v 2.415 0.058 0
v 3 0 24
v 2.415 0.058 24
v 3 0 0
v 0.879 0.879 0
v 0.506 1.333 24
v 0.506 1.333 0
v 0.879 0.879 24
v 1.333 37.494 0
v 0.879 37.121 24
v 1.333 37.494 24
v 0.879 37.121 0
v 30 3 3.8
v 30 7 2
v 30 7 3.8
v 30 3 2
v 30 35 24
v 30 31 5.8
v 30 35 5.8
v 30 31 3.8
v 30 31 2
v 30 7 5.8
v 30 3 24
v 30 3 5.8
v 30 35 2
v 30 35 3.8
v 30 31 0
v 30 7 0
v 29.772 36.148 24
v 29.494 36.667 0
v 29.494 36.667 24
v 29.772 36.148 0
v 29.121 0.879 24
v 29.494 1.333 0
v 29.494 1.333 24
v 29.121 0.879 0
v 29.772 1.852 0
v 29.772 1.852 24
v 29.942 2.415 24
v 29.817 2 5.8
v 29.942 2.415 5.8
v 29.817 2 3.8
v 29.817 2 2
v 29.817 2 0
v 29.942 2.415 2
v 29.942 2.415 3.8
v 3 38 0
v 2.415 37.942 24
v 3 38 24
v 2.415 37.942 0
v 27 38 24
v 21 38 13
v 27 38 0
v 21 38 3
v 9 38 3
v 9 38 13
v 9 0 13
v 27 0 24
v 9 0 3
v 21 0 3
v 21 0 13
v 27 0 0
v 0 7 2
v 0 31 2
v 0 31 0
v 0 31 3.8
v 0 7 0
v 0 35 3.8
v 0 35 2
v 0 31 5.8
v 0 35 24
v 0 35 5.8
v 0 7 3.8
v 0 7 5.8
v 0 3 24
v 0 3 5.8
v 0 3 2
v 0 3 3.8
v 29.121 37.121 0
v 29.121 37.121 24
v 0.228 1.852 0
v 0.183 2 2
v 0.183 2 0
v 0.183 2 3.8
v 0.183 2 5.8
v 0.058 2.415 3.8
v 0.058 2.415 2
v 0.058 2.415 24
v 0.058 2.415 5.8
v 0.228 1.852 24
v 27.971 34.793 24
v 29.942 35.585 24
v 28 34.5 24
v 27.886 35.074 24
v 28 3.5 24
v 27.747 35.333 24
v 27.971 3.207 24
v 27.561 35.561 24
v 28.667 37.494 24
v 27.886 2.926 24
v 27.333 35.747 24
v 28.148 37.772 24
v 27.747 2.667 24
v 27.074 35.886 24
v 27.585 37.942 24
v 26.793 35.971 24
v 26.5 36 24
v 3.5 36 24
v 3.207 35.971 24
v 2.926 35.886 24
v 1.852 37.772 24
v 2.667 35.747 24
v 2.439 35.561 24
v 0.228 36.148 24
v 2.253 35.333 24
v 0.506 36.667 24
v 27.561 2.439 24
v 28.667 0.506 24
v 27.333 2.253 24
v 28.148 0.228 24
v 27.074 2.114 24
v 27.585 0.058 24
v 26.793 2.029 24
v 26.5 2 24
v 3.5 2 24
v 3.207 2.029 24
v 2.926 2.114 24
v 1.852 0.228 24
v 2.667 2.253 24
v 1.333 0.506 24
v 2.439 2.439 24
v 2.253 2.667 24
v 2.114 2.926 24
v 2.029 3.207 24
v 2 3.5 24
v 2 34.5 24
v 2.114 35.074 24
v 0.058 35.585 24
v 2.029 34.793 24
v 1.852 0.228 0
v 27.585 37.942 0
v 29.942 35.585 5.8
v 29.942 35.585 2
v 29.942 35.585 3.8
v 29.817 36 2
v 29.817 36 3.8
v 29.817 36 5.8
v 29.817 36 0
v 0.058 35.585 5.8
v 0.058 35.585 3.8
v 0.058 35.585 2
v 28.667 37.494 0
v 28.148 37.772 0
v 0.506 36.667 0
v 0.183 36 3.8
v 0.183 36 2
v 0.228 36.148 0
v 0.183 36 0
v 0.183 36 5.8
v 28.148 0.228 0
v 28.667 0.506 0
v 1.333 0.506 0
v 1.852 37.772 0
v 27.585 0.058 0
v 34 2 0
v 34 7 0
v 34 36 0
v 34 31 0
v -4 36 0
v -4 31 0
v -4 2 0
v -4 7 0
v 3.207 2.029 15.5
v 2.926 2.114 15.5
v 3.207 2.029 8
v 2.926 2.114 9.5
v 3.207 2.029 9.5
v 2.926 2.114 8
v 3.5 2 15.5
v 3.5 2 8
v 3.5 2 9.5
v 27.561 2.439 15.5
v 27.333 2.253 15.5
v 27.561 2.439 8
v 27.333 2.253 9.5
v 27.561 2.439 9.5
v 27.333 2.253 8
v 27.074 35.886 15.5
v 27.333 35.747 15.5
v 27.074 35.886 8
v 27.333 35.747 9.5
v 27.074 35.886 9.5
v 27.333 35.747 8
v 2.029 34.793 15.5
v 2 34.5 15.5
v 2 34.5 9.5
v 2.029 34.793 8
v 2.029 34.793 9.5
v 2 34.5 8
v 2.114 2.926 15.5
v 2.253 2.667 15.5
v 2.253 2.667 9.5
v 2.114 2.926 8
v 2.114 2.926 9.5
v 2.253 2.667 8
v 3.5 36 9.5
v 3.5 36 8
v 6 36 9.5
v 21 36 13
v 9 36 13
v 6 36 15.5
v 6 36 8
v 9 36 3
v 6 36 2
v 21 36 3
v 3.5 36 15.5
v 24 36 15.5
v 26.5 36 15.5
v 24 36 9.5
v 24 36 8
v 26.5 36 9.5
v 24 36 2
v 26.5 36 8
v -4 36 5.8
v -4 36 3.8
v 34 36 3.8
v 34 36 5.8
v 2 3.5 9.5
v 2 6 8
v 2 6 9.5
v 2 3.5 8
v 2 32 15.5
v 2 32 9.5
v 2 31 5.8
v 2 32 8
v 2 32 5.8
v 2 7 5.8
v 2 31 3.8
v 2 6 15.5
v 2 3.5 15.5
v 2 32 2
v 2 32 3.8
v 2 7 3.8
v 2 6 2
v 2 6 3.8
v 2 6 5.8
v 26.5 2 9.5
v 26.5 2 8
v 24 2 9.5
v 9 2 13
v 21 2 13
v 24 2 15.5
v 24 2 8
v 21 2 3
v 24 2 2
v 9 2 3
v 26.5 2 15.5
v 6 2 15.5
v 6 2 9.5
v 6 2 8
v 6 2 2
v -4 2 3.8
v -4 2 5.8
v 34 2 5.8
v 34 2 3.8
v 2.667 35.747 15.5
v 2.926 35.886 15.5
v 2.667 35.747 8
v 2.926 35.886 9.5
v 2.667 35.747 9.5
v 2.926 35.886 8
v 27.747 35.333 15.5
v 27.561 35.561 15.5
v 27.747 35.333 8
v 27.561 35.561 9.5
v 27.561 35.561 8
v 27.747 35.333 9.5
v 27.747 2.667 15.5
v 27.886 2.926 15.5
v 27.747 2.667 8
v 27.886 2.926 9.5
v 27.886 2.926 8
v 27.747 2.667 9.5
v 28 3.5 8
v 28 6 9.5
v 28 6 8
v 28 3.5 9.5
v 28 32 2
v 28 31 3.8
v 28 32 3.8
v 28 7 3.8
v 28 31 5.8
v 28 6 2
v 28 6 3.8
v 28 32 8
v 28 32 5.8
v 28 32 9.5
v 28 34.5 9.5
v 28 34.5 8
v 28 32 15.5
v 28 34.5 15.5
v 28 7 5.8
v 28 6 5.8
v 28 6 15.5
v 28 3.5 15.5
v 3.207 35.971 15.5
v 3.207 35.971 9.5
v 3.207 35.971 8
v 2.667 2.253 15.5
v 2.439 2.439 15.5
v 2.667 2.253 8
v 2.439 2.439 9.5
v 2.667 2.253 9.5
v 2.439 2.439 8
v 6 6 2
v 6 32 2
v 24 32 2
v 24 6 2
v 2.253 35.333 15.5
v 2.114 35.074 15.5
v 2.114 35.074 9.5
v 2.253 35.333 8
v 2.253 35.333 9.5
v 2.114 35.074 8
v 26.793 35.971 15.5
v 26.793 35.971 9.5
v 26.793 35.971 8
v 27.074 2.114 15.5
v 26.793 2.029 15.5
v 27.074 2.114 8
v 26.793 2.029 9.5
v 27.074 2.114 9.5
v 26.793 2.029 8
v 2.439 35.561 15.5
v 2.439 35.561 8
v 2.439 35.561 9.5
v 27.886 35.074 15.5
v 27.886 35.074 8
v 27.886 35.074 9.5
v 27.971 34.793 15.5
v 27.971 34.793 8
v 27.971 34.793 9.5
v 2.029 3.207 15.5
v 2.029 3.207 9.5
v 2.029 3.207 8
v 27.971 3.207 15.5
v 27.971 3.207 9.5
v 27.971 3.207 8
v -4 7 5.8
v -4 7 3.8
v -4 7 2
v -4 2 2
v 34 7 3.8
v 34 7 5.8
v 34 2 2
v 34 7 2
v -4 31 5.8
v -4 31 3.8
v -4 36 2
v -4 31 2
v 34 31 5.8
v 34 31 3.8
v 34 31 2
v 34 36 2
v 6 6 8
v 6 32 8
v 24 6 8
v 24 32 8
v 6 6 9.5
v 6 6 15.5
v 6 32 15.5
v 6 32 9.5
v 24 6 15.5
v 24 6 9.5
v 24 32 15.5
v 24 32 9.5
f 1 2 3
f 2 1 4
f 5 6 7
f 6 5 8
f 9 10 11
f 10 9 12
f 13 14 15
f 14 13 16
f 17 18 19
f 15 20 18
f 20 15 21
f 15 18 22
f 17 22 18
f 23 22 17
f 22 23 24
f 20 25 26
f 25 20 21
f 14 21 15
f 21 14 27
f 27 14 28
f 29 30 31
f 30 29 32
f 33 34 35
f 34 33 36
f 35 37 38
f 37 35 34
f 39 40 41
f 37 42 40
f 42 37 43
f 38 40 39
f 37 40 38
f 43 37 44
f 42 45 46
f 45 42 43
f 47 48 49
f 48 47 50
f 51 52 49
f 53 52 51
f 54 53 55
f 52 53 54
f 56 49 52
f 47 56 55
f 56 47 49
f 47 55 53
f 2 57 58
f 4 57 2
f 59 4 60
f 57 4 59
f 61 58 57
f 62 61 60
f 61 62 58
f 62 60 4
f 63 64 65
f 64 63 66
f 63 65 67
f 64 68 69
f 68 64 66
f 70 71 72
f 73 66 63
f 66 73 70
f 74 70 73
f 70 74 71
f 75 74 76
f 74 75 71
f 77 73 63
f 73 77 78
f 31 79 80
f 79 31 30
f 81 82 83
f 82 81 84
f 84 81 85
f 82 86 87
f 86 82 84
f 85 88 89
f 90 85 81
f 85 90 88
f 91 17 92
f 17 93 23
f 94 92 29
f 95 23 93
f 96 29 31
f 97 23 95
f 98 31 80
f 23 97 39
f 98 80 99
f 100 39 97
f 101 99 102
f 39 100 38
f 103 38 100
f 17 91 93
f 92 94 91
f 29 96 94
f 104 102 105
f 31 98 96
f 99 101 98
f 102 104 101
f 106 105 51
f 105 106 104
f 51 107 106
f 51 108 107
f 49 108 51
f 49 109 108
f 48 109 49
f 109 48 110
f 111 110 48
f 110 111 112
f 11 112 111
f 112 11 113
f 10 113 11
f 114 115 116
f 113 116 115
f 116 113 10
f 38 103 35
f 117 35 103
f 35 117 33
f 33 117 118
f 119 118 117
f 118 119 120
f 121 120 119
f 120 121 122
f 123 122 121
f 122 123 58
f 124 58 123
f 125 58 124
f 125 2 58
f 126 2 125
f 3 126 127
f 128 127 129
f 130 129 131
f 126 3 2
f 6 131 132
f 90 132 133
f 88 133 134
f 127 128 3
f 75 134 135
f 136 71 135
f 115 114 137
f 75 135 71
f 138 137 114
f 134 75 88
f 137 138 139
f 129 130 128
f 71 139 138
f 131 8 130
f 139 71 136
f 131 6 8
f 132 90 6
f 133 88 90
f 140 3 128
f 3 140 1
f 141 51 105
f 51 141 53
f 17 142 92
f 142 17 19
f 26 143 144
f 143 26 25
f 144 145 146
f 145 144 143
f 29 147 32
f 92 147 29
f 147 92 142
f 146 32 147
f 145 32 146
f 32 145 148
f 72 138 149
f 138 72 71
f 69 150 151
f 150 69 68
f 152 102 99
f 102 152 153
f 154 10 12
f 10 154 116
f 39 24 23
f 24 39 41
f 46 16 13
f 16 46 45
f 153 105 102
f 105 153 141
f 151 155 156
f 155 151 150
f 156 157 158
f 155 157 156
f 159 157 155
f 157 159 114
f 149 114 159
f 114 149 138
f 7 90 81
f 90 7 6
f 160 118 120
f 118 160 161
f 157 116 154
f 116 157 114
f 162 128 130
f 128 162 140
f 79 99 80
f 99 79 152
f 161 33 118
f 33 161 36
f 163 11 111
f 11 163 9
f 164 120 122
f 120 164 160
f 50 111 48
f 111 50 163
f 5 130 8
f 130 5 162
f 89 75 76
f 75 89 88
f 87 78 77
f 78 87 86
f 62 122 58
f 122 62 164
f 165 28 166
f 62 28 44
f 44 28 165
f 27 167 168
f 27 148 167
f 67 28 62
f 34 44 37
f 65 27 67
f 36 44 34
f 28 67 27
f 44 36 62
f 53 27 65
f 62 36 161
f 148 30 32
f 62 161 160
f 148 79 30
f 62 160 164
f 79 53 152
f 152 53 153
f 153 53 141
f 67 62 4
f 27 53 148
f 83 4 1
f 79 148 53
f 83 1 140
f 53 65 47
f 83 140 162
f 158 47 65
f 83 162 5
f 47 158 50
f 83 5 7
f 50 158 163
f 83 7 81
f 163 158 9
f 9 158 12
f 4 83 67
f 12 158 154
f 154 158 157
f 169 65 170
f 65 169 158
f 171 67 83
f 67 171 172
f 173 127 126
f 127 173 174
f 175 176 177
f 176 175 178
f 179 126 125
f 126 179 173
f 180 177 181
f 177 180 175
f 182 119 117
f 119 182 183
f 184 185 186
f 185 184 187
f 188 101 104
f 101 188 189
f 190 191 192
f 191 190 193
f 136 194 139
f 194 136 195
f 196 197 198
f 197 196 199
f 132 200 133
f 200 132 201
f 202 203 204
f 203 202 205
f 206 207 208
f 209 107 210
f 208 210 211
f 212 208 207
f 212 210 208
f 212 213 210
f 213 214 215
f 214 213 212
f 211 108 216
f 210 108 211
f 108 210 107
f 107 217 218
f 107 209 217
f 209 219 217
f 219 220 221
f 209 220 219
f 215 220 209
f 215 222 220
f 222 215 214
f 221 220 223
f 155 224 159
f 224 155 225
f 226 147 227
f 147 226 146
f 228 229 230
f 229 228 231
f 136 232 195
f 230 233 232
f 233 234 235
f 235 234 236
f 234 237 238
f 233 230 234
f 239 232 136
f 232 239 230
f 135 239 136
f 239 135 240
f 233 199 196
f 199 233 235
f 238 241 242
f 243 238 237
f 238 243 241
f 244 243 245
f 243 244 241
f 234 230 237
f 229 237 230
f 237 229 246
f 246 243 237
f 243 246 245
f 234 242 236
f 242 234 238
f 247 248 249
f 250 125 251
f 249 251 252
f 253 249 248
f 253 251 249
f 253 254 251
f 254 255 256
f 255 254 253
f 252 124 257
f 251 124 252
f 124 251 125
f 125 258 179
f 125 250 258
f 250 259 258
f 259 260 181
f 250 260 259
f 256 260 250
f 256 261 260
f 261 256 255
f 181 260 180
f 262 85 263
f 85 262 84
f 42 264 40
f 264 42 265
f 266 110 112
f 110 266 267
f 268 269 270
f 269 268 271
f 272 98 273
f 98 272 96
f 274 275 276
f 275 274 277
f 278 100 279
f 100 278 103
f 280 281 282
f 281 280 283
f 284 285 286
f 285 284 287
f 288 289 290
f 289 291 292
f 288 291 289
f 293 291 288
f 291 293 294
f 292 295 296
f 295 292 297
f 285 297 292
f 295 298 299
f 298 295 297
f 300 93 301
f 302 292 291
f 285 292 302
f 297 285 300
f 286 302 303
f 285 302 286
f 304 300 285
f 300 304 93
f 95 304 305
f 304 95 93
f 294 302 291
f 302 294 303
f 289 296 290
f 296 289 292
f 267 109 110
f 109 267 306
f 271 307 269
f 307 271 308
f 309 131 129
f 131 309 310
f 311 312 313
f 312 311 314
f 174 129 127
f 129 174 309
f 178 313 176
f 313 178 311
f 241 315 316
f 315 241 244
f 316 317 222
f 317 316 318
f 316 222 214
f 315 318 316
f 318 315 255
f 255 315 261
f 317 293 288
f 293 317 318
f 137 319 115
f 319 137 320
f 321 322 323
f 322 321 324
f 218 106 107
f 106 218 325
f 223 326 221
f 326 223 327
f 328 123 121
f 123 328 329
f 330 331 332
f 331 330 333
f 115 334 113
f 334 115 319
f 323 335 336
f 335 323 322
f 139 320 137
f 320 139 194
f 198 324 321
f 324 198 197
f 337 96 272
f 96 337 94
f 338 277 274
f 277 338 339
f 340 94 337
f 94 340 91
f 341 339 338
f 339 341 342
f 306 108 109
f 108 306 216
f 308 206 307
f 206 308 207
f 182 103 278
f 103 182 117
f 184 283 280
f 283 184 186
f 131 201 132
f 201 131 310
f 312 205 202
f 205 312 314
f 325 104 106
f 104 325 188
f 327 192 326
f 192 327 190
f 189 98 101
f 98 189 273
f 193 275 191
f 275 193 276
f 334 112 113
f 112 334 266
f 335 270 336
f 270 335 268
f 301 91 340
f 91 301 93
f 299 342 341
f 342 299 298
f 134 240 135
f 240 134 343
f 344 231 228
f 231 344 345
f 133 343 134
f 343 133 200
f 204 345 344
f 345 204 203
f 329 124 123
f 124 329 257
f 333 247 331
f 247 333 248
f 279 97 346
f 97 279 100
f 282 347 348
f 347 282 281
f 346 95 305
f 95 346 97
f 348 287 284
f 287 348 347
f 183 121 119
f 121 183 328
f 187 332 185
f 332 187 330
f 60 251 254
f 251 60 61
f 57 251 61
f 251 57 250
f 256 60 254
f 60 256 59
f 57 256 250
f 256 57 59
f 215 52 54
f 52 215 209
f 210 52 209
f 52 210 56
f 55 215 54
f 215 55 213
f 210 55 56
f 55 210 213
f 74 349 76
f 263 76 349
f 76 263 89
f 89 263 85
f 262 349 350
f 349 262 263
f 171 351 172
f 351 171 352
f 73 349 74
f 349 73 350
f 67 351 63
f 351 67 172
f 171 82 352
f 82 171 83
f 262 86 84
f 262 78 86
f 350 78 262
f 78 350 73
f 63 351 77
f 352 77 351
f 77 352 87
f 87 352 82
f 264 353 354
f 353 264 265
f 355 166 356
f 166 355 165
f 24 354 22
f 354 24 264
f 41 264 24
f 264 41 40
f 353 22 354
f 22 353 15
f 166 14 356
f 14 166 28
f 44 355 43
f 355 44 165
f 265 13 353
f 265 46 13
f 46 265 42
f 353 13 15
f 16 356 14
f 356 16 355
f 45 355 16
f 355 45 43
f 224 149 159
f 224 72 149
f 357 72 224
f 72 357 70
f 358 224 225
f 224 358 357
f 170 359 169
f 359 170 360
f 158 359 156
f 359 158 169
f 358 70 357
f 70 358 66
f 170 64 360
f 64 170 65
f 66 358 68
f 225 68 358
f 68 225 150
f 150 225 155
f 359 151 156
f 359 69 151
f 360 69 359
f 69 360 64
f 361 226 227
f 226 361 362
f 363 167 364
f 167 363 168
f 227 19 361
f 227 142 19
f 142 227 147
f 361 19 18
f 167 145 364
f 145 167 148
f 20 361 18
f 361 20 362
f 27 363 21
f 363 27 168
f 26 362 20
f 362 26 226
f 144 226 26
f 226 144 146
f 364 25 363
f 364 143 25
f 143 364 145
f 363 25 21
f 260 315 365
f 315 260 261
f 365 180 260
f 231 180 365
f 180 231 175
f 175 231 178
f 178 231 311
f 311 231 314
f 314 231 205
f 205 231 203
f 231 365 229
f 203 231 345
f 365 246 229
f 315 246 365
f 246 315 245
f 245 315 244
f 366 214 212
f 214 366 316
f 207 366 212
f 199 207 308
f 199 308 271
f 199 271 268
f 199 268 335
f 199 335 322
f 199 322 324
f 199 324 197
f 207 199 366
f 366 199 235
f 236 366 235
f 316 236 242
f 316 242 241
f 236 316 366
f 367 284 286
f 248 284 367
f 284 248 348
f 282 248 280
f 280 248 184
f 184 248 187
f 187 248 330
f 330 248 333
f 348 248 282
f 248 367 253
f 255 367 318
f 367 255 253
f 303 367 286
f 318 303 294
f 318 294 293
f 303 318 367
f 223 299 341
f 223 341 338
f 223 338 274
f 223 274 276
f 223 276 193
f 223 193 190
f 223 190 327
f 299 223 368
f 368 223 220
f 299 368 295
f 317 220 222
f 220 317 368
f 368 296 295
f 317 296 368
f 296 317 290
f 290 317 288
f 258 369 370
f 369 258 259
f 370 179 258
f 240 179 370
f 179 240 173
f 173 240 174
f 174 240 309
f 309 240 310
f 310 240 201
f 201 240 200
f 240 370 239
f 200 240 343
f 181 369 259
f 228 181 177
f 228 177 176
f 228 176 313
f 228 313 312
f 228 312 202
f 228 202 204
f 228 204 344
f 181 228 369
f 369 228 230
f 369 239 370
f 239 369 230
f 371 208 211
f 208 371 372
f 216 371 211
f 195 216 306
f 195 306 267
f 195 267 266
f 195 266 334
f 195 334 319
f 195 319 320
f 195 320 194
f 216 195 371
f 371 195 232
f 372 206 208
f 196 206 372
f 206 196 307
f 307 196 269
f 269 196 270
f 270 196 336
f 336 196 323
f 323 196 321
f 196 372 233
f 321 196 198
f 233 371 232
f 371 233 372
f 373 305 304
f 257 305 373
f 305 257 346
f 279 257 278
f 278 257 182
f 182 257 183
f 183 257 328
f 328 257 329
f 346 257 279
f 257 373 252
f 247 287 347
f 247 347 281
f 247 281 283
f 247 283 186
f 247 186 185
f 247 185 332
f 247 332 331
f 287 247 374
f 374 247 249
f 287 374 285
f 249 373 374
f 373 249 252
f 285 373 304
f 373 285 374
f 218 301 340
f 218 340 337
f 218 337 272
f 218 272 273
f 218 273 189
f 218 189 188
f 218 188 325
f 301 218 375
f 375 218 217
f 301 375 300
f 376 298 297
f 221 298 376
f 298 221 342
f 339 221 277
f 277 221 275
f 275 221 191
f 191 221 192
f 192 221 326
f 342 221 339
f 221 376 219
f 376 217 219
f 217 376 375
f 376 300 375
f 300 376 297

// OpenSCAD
// Receiver Stack Housing for NATO Strap (22mm)
// Holds: PowerBoost 500C, Seeed XIAO ESP32-C3, TCA9548A Multiplexer

// Parameters
wall_thickness = 2.0;
strap_width = 22.5;
strap_thickness = 1.8;
lug_width = 5.0;
lug_clearance = 1.5;

// Component approximate dimensions (L x W x H)
// PowerBoost 500C: 29 x 22 x 7
// XIAO ESP32-C3: 21 x 17.5 x 5
// TCA9548A: 25.5 x 18 x 5 (Adafruit size)
// Stacked with clearance: 
inner_length = 34; 
inner_width = 26;
inner_height = 22;

module rounded_box(w, l, h, r) {
    hull() {
        translate([r, r, 0]) cylinder(r=r, h=h, $fn=32);
        translate([w-r, r, 0]) cylinder(r=r, h=h, $fn=32);
        translate([r, l-r, 0]) cylinder(r=r, h=h, $fn=32);
        translate([w-r, l-r, 0]) cylinder(r=r, h=h, $fn=32);
    }
}

module receiver_housing() {
    outer_w = inner_width + wall_thickness*2;
    outer_l = inner_length + wall_thickness*2;
    outer_h = inner_height + wall_thickness; // open top (lid assumed separate)
    
    difference() {
        // Main Body
        rounded_box(outer_w, outer_l, outer_h, 3);
        
        // Inner Cavity
        translate([wall_thickness, wall_thickness, wall_thickness])
            rounded_box(inner_width, inner_length, inner_height + 1, 1.5);
            
        // Cutout for USB-C / Power
        translate([outer_w/2 - 6, -1, wall_thickness + 1])
            cube([12, wall_thickness + 2, 10]);
            
        // Cutout for I2C and Power cables to the pods
        translate([outer_w/2 - 6, outer_l - wall_thickness - 1, wall_thickness + 1])
            cube([12, wall_thickness + 2, 10]);
    }
    
    // NATO Strap Lugs (Side mounts)
    lug_offset_x = 4;
    for (y = [2, outer_l - lug_width - 2]) {
        // Left Lug
        translate([-lug_offset_x, y, 0]) {
            difference() {
                cube([lug_offset_x + wall_thickness, lug_width, strap_thickness + wall_thickness*2]);
                translate([-0.1, -0.1, wall_thickness])
                    cube([lug_offset_x + wall_thickness + 0.2, lug_width + 0.2, strap_thickness]);
            }
        }
        // Right Lug
        translate([outer_w - wall_thickness, y, 0]) {
            difference() {
                cube([lug_offset_x + wall_thickness, lug_width, strap_thickness + wall_thickness*2]);
                translate([-0.1, -0.1, wall_thickness])
                    cube([lug_offset_x + wall_thickness + 0.2, lug_width + 0.2, strap_thickness]);
            }
        }
    }
    
    // Internal Standoffs for Stacking
    standoff_w = 4;
    standoff_l = 4;
    
    // Lower Standoffs (for PowerBoost)
    for (x = [wall_thickness, outer_w - wall_thickness - standoff_w]) {
        for (y = [wall_thickness, outer_l - wall_thickness - standoff_l]) {
            translate([x, y, wall_thickness])
                cube([standoff_w, standoff_l, 6]);
        }
    }
    
    // Upper Standoffs (for XIAO / Mux)
    for (x = [wall_thickness, outer_w - wall_thickness - standoff_w]) {
        for (y = [wall_thickness, outer_l - wall_thickness - standoff_l]) {
            translate([x, y, wall_thickness + 6 + 1.5]) // 1.5 PCB thickness
                cube([standoff_w, standoff_l, 6]);
        }
    }
}

receiver_housing();
